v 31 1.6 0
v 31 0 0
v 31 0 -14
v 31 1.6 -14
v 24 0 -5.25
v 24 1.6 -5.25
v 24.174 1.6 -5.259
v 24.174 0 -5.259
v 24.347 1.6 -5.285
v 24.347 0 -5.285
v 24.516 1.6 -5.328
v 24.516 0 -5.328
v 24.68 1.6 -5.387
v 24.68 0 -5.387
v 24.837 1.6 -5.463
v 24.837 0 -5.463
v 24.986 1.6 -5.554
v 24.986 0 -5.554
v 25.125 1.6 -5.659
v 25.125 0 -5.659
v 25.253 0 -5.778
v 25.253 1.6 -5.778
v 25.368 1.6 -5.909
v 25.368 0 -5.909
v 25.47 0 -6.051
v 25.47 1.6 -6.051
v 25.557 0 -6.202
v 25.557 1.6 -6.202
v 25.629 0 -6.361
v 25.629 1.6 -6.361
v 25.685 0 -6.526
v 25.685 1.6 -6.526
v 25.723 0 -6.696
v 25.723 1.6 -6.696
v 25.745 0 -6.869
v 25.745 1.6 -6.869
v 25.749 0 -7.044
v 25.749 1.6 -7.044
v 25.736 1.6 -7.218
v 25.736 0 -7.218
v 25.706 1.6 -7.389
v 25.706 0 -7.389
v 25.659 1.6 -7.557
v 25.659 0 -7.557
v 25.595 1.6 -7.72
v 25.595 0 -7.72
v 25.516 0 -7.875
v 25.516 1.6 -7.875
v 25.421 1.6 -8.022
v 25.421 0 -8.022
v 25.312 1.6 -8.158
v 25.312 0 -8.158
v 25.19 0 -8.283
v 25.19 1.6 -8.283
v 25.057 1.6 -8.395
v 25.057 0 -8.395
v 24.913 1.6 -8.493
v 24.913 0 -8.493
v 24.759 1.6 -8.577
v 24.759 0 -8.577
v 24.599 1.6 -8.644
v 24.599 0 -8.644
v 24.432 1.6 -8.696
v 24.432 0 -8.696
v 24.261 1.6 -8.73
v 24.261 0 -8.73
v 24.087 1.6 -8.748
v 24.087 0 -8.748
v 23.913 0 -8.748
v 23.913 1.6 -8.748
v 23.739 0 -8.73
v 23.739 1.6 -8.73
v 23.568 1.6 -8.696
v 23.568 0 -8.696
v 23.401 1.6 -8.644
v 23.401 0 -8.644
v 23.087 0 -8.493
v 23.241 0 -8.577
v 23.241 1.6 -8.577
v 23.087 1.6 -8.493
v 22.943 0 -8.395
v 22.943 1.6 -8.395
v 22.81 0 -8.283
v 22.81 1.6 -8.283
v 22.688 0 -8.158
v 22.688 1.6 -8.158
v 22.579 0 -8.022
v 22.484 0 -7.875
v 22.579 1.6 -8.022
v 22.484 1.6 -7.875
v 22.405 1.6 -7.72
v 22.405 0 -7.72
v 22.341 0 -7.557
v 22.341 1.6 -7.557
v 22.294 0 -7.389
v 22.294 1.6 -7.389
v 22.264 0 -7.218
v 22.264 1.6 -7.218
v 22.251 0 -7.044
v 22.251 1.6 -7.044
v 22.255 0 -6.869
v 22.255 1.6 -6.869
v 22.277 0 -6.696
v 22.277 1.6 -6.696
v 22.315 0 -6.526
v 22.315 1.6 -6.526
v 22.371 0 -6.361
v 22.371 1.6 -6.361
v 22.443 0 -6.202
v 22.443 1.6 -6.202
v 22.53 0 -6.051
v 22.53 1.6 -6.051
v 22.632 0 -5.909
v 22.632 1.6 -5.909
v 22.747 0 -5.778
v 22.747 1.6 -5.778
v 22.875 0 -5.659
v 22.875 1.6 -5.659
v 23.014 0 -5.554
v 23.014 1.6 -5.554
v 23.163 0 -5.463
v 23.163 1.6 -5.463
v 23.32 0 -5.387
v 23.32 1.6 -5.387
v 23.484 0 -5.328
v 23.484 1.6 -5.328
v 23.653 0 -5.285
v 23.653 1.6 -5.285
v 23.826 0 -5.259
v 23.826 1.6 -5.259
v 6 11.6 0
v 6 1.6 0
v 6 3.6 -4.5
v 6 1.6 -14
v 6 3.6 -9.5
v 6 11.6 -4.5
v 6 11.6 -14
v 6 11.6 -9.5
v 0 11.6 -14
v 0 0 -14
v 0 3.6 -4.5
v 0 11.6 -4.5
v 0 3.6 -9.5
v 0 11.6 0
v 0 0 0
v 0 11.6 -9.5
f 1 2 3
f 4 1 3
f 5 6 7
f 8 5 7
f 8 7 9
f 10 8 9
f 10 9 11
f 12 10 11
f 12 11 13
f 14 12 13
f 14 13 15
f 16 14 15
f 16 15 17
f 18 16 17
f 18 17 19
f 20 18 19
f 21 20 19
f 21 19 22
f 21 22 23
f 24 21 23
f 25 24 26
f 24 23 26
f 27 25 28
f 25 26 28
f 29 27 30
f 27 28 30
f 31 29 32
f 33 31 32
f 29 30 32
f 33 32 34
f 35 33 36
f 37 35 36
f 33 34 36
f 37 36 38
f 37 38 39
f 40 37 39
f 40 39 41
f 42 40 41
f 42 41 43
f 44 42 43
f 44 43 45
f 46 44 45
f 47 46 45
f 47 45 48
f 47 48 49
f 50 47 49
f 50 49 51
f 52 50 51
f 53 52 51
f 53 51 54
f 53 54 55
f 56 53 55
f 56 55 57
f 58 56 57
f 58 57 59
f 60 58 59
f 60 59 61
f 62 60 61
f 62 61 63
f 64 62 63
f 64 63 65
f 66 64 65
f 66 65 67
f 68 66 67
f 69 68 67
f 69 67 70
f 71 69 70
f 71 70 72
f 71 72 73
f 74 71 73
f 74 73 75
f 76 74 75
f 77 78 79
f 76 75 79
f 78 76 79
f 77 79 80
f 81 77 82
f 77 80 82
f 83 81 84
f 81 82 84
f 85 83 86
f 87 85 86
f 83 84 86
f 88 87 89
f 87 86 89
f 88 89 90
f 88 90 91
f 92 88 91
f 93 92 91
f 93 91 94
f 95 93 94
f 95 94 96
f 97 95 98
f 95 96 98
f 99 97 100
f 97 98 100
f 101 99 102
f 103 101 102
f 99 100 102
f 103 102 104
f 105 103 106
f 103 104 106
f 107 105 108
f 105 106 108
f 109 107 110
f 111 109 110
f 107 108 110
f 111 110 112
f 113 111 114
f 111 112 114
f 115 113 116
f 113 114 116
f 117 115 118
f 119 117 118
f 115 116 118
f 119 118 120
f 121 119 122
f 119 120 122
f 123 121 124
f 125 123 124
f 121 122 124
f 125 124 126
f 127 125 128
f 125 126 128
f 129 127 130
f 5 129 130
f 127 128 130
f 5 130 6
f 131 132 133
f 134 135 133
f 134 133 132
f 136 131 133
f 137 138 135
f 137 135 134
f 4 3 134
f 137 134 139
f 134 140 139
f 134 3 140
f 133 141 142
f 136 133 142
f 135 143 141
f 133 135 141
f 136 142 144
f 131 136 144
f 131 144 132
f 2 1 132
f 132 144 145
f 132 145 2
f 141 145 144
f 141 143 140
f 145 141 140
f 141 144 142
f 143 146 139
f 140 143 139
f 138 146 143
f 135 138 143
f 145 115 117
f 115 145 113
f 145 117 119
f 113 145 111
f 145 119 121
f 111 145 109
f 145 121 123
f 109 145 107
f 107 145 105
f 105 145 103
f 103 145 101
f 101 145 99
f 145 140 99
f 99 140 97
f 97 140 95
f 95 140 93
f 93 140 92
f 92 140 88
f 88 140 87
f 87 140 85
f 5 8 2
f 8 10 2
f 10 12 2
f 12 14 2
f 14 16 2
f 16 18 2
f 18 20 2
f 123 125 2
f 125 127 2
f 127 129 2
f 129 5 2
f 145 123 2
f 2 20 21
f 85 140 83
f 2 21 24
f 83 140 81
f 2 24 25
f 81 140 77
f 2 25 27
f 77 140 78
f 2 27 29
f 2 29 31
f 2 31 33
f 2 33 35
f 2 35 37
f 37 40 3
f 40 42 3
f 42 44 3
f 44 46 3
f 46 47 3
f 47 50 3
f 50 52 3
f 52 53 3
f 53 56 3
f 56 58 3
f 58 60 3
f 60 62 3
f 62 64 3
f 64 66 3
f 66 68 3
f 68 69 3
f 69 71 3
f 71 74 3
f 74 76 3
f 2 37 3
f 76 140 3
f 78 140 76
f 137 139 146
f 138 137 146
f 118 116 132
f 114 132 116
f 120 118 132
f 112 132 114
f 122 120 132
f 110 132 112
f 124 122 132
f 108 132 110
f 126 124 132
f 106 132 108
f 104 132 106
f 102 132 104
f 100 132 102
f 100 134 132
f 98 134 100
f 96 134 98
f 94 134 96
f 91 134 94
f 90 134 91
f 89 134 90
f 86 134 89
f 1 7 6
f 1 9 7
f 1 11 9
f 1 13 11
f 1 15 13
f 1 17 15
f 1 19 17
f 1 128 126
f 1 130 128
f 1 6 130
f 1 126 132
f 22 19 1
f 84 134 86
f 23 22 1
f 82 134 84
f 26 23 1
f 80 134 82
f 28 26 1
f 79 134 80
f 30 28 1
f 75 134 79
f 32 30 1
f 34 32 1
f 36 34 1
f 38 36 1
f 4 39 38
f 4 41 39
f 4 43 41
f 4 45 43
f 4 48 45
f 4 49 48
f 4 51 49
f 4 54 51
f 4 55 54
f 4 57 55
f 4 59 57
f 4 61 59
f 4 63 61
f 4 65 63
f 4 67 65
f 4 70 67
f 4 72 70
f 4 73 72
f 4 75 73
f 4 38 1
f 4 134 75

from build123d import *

# Parameters (mm, degrees)
SCHIZZO2_W                   = 31
SCHIZZO2_H                   = 14
ESTRUSIONE_ESTRUSIONE1_DEPTH = 1.6
ESTRUSIONE_ESTRUSIONE2_DEPTH = 6
TAGLIO_ESTRUSIONE1_REACH     = 37.454
SCHIZZO4_R                   = 1.75


with BuildPart() as part:
    # Schizzo2 → Estrusione-Estrusione1 (new body)
    with BuildSketch(Plane(origin=(0, 0, 0), x_dir=(1, 0, 0), z_dir=(0, 1, 0))):
        with Locations((15.5, 7)):
            Rectangle(SCHIZZO2_W, SCHIZZO2_H)
    extrude(amount=ESTRUSIONE_ESTRUSIONE1_DEPTH)

    # Schizzo3 → Estrusione-Estrusione2 (add)
    with BuildSketch(Plane.ZY):
        Polygon((-14, 1.6), (-14, 11.6), (-9.5, 11.6), (-9.5, 3.6), (-4.5, 3.6), (-4.5, 11.6), (0, 11.6), (0, 1.6), align=None)
    extrude(amount=-ESTRUSIONE_ESTRUSIONE2_DEPTH)

    # Schizzo4 → Taglio-Estrusione1 (cut, up to next)
    with BuildSketch(Plane(origin=(0, 1.6, 0), x_dir=(1, 0, 0), z_dir=(0, 1, 0)), mode=Mode.PRIVATE) as taglio_estrusione1_sk1:
        with Locations(Location((24, 7, 0), (0, 0, 270))):
            Circle(SCHIZZO4_R)
    taglio_estrusione1_tool1 = extrude(taglio_estrusione1_sk1.sketch, amount=-TAGLIO_ESTRUSIONE1_REACH, mode=Mode.PRIVATE) & part.part
    add(taglio_estrusione1_tool1.solids().sort_by_distance((24, 1.6, -7))[0], mode=Mode.SUBTRACT)


solid = part.part
